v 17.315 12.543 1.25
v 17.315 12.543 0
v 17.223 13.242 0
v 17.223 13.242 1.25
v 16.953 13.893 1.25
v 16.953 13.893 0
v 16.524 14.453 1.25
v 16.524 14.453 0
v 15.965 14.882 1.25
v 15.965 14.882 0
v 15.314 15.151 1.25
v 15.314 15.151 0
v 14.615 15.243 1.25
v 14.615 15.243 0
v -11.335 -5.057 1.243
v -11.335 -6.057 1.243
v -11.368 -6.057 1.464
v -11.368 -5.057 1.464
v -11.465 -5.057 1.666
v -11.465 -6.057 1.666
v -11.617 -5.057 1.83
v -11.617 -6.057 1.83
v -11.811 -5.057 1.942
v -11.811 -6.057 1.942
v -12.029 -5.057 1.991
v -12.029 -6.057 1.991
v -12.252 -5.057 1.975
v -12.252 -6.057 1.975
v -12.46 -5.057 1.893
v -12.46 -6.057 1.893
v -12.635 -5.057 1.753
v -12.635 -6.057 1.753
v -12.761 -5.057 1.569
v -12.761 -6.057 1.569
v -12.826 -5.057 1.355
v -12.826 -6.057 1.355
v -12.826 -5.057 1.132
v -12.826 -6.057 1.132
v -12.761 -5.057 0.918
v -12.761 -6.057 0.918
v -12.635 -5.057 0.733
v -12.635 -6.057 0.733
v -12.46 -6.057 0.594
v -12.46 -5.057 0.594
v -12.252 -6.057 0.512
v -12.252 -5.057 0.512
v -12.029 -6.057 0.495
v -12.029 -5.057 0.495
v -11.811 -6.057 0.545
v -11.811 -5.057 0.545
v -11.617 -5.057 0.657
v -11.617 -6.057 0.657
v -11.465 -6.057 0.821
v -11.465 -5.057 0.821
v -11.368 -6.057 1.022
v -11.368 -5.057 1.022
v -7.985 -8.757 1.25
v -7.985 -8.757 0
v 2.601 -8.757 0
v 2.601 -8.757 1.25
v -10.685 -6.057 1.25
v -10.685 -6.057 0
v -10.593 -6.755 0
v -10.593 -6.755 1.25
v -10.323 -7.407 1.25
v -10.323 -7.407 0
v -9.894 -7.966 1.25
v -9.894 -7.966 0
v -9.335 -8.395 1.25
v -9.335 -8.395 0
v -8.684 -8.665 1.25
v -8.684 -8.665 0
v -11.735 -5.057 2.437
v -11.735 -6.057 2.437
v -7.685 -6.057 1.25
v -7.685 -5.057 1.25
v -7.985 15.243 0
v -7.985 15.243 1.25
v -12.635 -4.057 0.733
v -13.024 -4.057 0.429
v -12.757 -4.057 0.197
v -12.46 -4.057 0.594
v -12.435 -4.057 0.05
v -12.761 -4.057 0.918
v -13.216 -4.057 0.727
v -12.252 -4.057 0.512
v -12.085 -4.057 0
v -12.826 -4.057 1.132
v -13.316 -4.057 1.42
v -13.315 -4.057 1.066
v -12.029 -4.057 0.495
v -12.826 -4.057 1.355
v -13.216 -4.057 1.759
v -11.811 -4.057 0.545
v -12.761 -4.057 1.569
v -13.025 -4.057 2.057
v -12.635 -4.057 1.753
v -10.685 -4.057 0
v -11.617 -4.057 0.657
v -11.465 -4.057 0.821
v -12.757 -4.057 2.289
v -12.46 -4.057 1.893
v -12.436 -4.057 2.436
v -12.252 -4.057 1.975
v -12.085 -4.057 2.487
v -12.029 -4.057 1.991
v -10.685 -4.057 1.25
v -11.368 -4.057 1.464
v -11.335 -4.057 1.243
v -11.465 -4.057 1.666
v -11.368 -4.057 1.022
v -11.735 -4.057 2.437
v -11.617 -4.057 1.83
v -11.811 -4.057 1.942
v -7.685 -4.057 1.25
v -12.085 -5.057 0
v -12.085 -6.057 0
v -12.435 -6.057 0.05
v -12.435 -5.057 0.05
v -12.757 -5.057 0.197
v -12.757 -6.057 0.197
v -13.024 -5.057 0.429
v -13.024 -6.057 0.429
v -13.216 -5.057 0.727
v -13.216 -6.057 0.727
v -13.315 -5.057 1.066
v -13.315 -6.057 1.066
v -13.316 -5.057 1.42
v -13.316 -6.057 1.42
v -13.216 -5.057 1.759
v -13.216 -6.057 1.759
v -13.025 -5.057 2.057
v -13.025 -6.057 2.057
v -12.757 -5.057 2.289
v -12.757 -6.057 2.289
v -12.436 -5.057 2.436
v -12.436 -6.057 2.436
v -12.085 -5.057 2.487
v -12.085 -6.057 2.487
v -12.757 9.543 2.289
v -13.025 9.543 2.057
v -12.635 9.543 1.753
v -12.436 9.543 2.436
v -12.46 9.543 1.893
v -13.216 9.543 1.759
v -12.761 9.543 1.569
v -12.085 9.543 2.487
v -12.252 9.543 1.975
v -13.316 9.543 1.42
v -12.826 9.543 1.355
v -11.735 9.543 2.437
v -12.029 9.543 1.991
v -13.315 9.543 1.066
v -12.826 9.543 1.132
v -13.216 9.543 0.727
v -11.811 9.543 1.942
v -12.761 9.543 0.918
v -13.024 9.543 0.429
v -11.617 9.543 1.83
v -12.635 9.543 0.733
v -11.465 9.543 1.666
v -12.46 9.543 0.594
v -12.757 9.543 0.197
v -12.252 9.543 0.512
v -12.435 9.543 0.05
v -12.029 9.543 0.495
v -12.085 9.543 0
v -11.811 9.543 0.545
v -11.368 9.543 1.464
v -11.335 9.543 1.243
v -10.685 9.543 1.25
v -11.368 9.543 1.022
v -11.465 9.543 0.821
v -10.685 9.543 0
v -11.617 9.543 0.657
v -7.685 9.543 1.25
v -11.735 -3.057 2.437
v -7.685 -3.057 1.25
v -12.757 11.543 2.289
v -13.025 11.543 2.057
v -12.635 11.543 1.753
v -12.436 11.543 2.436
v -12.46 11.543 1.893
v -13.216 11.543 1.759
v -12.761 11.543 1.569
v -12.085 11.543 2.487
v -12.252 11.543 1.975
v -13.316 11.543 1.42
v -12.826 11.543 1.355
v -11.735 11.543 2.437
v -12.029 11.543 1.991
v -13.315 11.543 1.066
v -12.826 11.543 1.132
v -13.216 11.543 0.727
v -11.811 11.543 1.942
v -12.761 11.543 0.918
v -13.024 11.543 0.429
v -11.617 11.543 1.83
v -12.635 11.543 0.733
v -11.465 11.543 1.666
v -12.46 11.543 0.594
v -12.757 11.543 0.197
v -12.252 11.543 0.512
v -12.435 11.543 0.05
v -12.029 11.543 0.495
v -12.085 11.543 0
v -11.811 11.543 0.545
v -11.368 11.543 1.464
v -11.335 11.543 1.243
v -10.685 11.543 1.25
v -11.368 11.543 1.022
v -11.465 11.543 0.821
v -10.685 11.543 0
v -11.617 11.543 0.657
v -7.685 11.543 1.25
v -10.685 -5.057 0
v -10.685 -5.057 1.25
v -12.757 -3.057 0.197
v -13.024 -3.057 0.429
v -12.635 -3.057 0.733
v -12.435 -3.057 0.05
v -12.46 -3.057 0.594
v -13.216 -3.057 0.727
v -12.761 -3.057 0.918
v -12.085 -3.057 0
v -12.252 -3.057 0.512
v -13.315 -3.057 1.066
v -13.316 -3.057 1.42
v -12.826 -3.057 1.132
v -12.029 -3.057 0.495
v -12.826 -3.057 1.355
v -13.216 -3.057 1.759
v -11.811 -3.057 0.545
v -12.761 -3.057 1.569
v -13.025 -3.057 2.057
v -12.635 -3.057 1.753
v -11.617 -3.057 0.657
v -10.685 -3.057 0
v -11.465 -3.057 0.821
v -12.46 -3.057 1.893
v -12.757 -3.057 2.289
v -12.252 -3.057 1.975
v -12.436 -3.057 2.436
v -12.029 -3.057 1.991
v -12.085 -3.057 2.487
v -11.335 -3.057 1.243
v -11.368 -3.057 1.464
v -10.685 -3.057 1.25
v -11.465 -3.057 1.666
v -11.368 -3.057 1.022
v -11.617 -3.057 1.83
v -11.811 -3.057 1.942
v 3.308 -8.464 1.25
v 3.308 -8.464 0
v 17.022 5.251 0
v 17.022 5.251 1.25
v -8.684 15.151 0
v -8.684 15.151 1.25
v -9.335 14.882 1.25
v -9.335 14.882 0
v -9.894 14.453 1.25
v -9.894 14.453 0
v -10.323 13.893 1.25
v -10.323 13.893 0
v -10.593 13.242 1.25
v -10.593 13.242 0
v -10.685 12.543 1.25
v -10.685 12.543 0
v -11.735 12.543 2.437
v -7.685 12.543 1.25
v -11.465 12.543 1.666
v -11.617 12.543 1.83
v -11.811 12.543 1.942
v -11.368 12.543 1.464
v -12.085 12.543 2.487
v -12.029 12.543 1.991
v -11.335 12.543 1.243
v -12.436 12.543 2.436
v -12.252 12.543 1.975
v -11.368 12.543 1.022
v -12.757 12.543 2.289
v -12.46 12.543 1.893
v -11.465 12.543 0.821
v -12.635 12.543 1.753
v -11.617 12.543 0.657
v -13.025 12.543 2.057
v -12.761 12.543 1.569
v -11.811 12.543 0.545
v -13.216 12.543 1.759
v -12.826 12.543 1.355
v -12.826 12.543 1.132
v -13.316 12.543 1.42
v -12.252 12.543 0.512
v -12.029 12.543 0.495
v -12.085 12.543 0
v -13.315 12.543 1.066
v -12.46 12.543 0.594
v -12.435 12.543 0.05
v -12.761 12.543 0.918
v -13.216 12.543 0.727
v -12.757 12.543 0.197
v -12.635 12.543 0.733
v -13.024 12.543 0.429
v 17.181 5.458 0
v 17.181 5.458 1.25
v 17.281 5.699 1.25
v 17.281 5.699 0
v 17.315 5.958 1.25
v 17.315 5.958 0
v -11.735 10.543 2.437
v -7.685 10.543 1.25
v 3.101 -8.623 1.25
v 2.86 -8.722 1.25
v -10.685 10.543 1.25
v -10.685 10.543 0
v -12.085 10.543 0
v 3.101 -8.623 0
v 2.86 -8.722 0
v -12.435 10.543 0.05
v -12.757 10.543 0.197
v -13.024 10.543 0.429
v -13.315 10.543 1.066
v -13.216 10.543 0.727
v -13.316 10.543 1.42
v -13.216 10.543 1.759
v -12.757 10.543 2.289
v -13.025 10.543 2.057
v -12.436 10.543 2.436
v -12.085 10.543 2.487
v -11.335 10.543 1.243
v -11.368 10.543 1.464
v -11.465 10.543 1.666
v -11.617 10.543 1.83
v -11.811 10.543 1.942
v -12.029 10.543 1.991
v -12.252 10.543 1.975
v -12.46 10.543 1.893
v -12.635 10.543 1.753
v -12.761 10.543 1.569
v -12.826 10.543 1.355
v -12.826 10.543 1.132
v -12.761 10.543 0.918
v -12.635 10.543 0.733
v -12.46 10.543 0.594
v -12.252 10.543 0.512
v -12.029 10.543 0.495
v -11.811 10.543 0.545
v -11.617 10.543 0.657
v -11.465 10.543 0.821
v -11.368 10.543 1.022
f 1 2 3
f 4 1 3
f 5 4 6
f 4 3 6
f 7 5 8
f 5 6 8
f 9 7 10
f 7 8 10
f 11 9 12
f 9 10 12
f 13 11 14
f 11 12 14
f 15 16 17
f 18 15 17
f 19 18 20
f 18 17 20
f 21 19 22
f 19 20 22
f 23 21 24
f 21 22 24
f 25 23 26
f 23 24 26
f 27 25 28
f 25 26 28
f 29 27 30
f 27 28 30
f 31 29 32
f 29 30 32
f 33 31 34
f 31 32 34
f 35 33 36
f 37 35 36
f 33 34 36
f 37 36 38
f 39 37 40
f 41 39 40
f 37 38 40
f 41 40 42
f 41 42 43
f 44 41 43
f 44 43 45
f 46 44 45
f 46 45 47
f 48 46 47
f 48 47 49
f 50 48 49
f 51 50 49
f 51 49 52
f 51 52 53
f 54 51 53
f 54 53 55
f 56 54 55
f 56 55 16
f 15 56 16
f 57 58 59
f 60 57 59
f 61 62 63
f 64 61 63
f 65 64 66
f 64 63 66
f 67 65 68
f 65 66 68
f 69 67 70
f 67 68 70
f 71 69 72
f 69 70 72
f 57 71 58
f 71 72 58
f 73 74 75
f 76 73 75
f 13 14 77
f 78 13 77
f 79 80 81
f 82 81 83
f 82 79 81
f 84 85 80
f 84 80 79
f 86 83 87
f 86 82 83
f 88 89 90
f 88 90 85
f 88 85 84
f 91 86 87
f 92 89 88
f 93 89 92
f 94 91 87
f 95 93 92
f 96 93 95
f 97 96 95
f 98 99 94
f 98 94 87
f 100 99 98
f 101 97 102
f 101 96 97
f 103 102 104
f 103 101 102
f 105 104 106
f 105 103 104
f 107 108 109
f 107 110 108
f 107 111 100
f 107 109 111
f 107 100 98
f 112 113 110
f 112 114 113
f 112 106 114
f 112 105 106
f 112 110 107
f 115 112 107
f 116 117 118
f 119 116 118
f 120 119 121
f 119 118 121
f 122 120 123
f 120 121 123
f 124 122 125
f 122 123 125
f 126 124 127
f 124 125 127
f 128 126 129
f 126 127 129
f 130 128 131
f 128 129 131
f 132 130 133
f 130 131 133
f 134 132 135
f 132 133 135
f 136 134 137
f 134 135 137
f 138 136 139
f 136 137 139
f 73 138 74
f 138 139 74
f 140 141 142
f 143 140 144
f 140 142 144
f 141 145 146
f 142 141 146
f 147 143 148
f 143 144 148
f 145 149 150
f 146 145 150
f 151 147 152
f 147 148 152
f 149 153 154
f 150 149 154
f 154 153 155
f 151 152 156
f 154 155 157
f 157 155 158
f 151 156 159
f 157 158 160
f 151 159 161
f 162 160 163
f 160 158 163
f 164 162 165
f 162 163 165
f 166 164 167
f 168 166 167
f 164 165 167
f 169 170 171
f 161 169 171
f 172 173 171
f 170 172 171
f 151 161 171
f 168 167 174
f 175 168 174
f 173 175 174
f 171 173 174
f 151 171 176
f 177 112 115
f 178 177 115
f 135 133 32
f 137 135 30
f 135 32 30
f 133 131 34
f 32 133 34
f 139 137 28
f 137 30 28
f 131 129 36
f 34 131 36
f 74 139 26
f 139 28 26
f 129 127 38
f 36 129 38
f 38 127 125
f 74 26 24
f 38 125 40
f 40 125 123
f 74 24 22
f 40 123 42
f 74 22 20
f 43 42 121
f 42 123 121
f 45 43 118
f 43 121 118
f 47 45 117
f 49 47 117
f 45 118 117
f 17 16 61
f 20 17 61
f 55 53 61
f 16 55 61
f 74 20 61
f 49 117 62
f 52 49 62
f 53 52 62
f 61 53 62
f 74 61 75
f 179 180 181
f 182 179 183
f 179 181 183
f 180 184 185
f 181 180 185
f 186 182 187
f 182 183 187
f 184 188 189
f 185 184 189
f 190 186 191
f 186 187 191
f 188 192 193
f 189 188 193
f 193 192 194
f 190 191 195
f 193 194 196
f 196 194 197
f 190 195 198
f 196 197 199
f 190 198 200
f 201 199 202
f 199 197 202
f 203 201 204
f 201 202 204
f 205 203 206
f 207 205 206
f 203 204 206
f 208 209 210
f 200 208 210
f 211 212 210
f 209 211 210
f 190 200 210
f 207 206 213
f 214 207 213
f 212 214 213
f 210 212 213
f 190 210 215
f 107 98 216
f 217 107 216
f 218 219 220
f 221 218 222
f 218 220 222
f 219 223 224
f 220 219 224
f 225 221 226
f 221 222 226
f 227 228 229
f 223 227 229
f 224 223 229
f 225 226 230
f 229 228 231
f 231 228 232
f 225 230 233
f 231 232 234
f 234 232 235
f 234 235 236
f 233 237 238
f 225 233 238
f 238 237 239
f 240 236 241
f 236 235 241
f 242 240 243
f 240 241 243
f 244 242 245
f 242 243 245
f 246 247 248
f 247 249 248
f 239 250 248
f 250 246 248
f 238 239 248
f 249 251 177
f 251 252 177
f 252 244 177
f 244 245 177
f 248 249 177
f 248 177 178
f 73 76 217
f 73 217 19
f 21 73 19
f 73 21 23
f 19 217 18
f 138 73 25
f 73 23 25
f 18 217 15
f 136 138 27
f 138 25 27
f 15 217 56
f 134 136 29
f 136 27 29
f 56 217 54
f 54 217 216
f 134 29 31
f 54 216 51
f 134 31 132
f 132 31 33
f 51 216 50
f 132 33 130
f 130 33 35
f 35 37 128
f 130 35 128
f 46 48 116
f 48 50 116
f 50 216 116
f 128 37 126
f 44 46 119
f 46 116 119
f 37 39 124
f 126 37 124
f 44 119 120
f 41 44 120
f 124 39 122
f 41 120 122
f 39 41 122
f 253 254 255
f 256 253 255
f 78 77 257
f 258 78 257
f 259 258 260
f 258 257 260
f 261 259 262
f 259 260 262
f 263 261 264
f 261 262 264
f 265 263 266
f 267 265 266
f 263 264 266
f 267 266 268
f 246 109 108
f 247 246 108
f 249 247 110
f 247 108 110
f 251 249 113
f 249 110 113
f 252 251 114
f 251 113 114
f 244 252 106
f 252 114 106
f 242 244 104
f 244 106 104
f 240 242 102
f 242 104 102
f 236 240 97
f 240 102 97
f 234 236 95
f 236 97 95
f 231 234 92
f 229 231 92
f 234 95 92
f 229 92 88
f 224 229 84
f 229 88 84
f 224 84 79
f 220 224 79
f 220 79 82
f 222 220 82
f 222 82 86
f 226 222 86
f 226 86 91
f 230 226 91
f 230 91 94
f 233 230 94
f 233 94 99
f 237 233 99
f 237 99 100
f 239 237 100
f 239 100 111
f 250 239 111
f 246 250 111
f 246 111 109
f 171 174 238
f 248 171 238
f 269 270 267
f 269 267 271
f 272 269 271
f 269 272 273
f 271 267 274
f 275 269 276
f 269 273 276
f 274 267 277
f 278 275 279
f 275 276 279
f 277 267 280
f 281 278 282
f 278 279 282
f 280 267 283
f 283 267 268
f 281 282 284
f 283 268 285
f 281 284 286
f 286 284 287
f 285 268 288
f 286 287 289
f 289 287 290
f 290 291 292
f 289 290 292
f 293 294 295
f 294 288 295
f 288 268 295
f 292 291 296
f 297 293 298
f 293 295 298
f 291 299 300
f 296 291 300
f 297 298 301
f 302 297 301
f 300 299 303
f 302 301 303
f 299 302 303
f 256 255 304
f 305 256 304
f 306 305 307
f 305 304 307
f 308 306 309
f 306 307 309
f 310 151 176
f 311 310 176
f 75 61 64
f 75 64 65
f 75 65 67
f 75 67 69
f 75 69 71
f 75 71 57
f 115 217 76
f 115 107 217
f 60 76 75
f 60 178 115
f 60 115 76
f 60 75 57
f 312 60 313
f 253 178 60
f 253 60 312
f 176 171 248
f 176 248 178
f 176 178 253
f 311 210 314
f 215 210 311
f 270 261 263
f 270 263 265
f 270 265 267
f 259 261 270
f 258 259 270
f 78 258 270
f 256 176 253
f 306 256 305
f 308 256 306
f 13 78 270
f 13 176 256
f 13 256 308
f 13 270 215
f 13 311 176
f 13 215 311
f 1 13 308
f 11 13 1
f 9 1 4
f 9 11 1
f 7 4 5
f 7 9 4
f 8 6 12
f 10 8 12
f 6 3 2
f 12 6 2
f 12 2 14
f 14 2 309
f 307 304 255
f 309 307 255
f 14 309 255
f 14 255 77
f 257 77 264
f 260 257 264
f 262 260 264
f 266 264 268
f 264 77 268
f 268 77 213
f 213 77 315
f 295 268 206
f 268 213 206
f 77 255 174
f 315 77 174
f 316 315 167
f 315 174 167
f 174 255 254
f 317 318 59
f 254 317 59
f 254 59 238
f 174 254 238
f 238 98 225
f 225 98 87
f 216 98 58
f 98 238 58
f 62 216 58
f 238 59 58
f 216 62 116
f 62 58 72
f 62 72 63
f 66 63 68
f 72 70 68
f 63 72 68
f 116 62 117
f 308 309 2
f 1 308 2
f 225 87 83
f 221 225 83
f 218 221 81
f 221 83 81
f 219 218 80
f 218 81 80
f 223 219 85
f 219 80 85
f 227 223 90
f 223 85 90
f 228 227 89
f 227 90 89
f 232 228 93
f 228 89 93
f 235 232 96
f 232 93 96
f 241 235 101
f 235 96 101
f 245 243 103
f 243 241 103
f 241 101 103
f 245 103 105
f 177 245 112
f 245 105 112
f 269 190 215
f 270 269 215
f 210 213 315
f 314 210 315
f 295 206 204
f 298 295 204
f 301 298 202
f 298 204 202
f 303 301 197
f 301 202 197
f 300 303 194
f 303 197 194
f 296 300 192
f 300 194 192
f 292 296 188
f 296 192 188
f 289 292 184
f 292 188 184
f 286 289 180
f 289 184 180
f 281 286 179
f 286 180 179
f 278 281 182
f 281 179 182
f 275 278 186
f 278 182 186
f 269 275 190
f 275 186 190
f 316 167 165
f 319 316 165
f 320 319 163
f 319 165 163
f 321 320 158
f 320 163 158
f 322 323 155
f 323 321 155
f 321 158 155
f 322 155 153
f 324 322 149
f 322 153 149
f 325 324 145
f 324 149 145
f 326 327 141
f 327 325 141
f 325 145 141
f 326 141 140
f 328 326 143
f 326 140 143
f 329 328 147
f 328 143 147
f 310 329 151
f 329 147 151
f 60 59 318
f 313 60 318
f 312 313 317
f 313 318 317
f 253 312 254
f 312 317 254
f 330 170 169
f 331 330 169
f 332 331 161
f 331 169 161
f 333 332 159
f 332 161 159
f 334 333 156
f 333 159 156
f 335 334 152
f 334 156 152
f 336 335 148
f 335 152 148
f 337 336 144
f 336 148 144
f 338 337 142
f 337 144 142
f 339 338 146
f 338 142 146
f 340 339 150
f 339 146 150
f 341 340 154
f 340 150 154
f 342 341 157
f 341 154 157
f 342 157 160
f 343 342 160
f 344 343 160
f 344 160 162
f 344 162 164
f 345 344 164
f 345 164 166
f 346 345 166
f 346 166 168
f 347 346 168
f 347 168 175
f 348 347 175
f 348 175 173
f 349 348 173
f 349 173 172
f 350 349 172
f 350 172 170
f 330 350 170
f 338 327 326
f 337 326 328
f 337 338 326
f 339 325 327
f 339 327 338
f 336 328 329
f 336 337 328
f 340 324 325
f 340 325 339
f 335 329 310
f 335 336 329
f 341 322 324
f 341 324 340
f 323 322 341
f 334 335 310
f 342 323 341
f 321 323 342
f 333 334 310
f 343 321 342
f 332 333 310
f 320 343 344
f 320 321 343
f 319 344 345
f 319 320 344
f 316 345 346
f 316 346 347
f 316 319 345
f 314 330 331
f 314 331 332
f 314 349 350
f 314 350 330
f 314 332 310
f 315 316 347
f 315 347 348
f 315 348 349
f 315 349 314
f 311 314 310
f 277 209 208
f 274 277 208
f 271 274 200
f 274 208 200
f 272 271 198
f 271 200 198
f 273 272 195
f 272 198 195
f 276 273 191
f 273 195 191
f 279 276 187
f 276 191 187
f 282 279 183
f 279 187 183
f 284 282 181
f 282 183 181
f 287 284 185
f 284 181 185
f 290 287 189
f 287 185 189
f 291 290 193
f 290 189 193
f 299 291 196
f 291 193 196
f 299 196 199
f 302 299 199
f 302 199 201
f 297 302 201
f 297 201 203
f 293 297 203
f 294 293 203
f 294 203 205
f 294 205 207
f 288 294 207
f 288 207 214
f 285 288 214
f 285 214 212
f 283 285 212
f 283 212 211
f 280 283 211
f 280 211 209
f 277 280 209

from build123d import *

# Parameters (mm, degrees)
F1_DEPTH = 1.25
F2_W     = 6
F2_H     = 1
F3_DEPTH = 2.5
F4_R     = 0.75
F5_DEPTH = 75


# Not quite as in the source:
# - a feature names something its author has since deleted; it is built from what else it names


with BuildPart() as f1:
    # F0 (on Top) → F1 (new body)
    with BuildSketch(Plane.XY):
        with BuildLine():
            ThreePointArc((-7.984982332, 15.2434693582), (-9.8941706412, 14.4526576674), (-10.684982332, 12.5434693582))
            Line((-10.684982332, 12.5434693582), (-10.684982332, -6.0565306418))
            ThreePointArc((-10.684982332, -6.0565306418), (-9.8941706412, -7.965718951), (-7.984982332, -8.7565306418))
            Line((-7.984982332, -8.7565306418), (2.6008041056, -8.7565306418))
            ThreePointArc((2.6008041056, -8.7565306418), (2.983487538, -8.6804101743), (3.3079108868, -8.463637423))
            Line((3.3079108868, -8.463637423), (17.0221244492, 5.2505761394))
            ThreePointArc((17.0221244492, 5.2505761394), (17.2388972005, 5.5749994882), (17.315017668, 5.9576829206))
            Line((17.315017668, 5.9576829206), (17.315017668, 12.5434693582))
            ThreePointArc((17.315017668, 12.5434693582), (16.5242059772, 14.4526576674), (14.615017668, 15.2434693582))
            Line((14.615017668, 15.2434693582), (-7.984982332, 15.2434693582))
        make_face()
    extrude(amount=F1_DEPTH)

    # F2 (on face) → F3 (join, symmetric)
    with BuildSketch(Plane.XY.offset(1.25)):
        Polygon((-7.684982332, 12.5434693582), (-10.684982332, 12.5434693582), (-13.684982332, 12.5434693582), (-13.684982332, 11.5434693582), (-10.684982332, 11.5434693582), (-7.684982332, 11.5434693582), align=None)
        with Locations((-10.684982332, 10.0434693582)):
            Rectangle(F2_W, F2_H)
        Polygon((-13.684982332, -6.0565306418), (-10.684982332, -6.0565306418), (-7.684982332, -6.0565306418), (-7.684982332, -5.0565306418), (-10.684982332, -5.0565306418), (-13.684982332, -5.0565306418), align=None)
        with Locations((-10.684982332, -3.5565306418)):
            Rectangle(F2_W, F2_H)
    extrude(amount=F3_DEPTH, both=True)

    # F4 (on face) → F5 (cut)
    with BuildSketch(Plane.XZ.offset(6.0565306418)):
        with BuildLine():
            Line((-11.7352277888, 2.4365543881), (-7.684982332, 1.25))
            Line((-7.684982332, 1.25), (-7.684982332, 3.75))
            Line((-7.684982332, 3.75), (-13.684982332, 3.75))
            Line((-13.684982332, 3.75), (-13.684982332, -1.25))
            Line((-13.684982332, -1.25), (-7.684982332, -1.25))
            Line((-7.684982332, -1.25), (-7.684982332, 0))
            Line((-7.684982332, 0), (-10.684982332, 0))
            Line((-10.684982332, 0), (-12.0847867802, 0))
            ThreePointArc((-12.0847867802, 0), (-13.3155374428, 1.4199208375), (-11.7352277888, 2.4365543881))
        make_face()
        with Locations((-12.0847867802, 1.2433518423)):
            Circle(F4_R)
    extrude(amount=-F5_DEPTH, mode=Mode.SUBTRACT)


solid = f1.part
